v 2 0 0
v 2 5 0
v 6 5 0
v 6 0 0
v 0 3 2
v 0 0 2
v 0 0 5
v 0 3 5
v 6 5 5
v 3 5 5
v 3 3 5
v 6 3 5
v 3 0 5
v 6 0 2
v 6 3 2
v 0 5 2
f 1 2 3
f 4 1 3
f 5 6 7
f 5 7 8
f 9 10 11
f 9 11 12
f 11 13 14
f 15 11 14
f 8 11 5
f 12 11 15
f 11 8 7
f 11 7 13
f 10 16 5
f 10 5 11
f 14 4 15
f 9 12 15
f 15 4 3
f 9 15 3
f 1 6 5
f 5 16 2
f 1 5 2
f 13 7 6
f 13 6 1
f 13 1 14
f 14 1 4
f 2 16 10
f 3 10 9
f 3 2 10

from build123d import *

# Parameters (mm, degrees)
SKETCH1_W           = 6
SKETCH1_H           = 5
BOSS_EXTRUDE1_DEPTH = 5
CUT_EXTRUDE1_DEPTH  = 5
CUT_EXTRUDE2_DEPTH  = 2
CUT_EXTRUDE3_DEPTH  = 3


with BuildPart() as part:
    # Sketch1 → Boss-Extrude1 (new body)
    with BuildSketch(Plane.XY):
        with Locations((3, 2.5)):
            Rectangle(SKETCH1_W, SKETCH1_H)
    extrude(amount=BOSS_EXTRUDE1_DEPTH)

    # Sketch4 → Cut-Extrude1 (cut)
    with BuildSketch(Plane(origin=(0, 5, 0), x_dir=(1, 0, 0), z_dir=(0, 1, 0))):
        Polygon((0, -2), (2, 0), (0, 0), align=None)
    extrude(amount=-CUT_EXTRUDE1_DEPTH, mode=Mode.SUBTRACT)

    # Sketch5 → Cut-Extrude2 (cut)
    with BuildSketch(Plane(origin=(0, 5, 0), x_dir=(1, 0, 0), z_dir=(0, 1, 0))):
        Polygon((0, -2), (3, -5), (0, -5), align=None)
    extrude(amount=-CUT_EXTRUDE2_DEPTH, mode=Mode.SUBTRACT)

    # Sketch6 → Cut-Extrude3 (cut)
    with BuildSketch(Plane.XZ):
        Polygon((6, 5), (3, 5), (6, 2), align=None)
    extrude(amount=-CUT_EXTRUDE3_DEPTH, mode=Mode.SUBTRACT)


solid = part.part
